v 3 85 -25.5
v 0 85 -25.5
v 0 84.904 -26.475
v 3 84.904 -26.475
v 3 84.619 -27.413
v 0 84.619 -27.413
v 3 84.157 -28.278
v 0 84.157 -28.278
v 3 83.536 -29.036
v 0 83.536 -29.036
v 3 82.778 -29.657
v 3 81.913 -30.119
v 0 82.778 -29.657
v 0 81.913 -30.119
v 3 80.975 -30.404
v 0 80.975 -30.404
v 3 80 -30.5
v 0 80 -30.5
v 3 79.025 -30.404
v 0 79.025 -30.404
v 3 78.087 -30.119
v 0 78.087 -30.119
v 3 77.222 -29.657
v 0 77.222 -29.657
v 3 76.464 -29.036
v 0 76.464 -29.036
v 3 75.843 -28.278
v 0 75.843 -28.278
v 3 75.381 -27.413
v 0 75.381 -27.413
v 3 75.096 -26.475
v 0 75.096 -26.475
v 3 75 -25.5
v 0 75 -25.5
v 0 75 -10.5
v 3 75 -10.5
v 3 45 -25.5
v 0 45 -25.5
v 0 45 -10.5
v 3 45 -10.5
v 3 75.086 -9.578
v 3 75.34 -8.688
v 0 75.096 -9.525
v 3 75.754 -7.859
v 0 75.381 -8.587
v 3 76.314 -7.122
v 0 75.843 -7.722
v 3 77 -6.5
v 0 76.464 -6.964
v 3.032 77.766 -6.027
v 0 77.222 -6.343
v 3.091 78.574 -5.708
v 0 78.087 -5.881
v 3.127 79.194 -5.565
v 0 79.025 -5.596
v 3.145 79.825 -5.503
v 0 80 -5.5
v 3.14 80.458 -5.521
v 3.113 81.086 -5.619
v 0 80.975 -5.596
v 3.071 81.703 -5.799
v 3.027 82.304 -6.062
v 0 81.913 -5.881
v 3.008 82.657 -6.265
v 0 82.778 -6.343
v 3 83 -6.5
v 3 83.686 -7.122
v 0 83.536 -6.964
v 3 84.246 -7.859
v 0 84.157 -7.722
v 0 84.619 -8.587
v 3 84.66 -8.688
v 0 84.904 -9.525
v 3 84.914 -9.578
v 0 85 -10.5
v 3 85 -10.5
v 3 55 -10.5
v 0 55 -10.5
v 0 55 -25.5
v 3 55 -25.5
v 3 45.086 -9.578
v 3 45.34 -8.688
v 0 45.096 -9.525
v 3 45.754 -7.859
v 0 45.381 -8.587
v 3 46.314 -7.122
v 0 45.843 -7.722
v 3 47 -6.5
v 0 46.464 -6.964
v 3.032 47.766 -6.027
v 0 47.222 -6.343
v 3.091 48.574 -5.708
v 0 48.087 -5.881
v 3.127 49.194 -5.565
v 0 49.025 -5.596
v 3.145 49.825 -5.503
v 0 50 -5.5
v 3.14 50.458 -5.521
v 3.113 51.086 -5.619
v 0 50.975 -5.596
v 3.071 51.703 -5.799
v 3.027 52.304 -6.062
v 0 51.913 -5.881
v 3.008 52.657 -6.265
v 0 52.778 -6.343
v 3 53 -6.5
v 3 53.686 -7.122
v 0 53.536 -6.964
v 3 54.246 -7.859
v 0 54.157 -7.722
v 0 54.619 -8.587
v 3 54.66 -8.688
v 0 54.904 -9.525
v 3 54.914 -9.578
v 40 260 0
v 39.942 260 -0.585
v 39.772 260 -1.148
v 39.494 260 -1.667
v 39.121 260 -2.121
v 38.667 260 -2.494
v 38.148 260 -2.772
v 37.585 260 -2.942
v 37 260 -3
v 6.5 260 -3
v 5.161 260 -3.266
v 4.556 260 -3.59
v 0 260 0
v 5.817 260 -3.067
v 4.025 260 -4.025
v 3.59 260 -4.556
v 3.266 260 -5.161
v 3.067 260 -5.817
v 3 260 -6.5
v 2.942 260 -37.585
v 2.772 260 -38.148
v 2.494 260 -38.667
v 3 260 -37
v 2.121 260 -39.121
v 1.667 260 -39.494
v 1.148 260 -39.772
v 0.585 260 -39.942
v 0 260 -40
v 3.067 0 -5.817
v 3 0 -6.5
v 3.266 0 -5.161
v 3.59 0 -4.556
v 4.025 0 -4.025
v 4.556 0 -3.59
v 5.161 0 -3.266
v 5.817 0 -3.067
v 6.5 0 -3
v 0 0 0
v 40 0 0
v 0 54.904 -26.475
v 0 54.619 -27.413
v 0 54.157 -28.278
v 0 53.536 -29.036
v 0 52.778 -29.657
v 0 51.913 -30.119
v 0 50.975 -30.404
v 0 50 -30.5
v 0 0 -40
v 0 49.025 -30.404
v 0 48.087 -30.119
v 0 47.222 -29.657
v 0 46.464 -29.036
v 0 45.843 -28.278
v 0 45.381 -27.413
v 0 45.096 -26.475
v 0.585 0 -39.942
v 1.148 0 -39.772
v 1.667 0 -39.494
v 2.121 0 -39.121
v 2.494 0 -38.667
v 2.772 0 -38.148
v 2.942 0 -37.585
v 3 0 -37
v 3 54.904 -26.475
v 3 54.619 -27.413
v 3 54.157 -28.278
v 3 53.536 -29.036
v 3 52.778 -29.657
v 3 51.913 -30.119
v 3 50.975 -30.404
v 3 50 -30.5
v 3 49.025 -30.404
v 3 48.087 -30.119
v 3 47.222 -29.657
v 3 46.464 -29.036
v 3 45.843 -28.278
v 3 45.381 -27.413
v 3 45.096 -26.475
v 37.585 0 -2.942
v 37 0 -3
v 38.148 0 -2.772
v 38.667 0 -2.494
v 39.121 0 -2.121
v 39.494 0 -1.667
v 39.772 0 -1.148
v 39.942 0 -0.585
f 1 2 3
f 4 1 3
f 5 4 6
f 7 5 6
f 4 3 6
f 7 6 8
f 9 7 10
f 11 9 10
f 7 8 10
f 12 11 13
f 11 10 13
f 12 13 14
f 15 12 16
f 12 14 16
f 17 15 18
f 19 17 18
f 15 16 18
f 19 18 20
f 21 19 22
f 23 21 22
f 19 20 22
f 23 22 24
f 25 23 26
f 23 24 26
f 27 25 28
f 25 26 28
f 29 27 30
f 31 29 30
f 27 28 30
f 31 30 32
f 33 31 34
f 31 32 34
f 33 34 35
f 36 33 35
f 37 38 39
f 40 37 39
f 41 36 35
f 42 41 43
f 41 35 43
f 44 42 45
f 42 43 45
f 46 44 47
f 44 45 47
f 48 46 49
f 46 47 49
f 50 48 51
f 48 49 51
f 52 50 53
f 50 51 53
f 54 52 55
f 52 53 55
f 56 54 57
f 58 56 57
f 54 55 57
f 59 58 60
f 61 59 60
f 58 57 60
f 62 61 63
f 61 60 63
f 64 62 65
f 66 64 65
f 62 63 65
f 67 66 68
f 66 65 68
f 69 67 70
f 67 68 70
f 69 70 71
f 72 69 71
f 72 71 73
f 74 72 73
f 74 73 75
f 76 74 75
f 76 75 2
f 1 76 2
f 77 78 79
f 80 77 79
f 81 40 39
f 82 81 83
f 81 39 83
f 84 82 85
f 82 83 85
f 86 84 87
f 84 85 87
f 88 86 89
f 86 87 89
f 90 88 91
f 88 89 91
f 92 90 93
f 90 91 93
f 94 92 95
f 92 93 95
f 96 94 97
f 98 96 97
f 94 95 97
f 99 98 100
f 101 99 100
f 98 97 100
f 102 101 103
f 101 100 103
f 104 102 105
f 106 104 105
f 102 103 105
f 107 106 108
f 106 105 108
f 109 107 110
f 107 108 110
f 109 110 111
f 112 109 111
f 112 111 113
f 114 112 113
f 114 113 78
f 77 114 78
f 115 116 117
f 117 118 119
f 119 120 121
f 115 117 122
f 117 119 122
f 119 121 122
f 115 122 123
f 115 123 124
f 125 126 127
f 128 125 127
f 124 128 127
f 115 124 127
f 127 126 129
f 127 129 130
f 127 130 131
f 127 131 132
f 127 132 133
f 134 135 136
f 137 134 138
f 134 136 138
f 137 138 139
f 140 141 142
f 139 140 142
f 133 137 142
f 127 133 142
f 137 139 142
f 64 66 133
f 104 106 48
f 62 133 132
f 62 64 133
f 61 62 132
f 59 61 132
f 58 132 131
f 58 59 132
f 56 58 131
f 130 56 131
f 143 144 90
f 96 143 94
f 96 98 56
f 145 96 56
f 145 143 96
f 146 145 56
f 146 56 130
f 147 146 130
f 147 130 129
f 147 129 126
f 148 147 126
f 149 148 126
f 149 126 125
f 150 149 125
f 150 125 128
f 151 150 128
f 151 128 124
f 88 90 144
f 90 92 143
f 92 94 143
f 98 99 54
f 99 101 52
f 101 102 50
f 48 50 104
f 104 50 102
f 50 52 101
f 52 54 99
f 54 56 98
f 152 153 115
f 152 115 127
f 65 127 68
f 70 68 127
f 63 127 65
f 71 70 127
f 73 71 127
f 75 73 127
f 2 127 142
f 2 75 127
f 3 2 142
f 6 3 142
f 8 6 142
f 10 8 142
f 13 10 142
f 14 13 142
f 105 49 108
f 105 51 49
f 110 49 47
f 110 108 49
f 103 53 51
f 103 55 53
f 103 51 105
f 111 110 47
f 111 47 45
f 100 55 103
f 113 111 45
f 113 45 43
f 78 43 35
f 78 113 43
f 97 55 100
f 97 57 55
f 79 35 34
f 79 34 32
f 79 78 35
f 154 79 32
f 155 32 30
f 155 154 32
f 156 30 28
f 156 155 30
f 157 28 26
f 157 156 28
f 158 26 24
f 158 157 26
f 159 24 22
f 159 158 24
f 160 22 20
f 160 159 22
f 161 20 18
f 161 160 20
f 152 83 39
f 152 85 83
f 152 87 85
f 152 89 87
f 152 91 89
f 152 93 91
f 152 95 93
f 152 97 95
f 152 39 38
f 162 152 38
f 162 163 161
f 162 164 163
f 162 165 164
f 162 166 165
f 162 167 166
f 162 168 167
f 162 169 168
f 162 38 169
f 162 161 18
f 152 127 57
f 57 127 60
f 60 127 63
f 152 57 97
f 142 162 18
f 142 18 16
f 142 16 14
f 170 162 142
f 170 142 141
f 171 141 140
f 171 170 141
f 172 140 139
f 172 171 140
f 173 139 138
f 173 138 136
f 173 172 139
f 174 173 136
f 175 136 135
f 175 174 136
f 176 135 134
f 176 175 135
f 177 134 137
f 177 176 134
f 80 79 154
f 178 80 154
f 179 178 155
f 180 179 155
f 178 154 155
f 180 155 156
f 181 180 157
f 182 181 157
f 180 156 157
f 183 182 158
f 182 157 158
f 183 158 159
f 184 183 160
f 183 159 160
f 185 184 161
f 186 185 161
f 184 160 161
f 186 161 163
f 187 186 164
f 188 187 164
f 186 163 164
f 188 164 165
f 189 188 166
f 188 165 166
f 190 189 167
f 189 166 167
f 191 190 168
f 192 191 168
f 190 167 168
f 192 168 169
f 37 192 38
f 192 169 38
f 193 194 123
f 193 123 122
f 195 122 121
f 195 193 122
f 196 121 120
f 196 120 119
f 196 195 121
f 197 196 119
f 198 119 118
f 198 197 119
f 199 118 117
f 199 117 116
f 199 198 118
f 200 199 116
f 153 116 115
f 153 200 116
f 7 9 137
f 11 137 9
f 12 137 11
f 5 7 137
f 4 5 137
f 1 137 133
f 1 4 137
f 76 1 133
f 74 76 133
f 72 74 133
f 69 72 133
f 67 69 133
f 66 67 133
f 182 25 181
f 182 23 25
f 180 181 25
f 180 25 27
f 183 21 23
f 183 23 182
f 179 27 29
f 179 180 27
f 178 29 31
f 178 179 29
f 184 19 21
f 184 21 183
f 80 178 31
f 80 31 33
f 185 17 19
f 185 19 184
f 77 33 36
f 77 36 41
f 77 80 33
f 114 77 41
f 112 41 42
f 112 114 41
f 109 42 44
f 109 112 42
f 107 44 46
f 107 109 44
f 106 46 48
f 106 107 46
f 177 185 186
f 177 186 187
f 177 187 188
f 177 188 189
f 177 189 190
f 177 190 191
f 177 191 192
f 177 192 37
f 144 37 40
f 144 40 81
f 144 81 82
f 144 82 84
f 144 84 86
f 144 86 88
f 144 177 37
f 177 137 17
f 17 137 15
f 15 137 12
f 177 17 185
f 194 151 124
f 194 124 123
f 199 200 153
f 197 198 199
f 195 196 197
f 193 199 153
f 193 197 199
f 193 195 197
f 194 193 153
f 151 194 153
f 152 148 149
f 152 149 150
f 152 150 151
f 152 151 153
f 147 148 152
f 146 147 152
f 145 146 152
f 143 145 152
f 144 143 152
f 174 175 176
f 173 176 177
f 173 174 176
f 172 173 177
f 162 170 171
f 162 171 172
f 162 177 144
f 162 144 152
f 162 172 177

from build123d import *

# Parameters (mm, degrees)
IRON_V40X40X3_1_DEPTH = 260
CUT_EXTRUDE1_DEPTH    = 10


with BuildPart() as part:
    # Sketch1 → Iron V40X40X3(1) (new body)
    with BuildSketch(Plane(origin=(0, 0, 0), x_dir=(1, 0, 0), z_dir=(0, 1, 0))):
        with BuildLine():
            Line((0, 0), (0, 40))
            ThreePointArc((0, 40), (2.121320344, 39.121320344), (3, 37))
            Line((3, 37), (3, 6.5))
            ThreePointArc((3, 6.5), (4.025126266, 4.025126266), (6.5, 3))
            Line((6.5, 3), (37, 3))
            ThreePointArc((37, 3), (39.121320344, 2.121320344), (40, 0))
            Line((40, 0), (0, 0))
        make_face()
    extrude(amount=IRON_V40X40X3_1_DEPTH)

    # Sketch2 → Cut-Extrude1 (cut)
    with BuildSketch(Plane(origin=(0, 0, 0), x_dir=(0, 0, -1), z_dir=(1, 0, 0))):
        with BuildLine():
            Line((10.5, 55), (25.5, 55))
            ThreePointArc((25.5, 55), (30.5, 50), (25.5, 45))
            Line((25.5, 45), (10.5, 45))
            ThreePointArc((10.5, 45), (5.5, 50), (10.5, 55))
        make_face()
        with BuildLine():
            Line((10.5, 85), (25.5, 85))
            ThreePointArc((25.5, 85), (30.5, 80), (25.5, 75))
            Line((25.5, 75), (10.5, 75))
            ThreePointArc((10.5, 75), (5.5, 80), (10.5, 85))
        make_face()
    extrude(amount=CUT_EXTRUDE1_DEPTH, mode=Mode.SUBTRACT)


solid = part.part
